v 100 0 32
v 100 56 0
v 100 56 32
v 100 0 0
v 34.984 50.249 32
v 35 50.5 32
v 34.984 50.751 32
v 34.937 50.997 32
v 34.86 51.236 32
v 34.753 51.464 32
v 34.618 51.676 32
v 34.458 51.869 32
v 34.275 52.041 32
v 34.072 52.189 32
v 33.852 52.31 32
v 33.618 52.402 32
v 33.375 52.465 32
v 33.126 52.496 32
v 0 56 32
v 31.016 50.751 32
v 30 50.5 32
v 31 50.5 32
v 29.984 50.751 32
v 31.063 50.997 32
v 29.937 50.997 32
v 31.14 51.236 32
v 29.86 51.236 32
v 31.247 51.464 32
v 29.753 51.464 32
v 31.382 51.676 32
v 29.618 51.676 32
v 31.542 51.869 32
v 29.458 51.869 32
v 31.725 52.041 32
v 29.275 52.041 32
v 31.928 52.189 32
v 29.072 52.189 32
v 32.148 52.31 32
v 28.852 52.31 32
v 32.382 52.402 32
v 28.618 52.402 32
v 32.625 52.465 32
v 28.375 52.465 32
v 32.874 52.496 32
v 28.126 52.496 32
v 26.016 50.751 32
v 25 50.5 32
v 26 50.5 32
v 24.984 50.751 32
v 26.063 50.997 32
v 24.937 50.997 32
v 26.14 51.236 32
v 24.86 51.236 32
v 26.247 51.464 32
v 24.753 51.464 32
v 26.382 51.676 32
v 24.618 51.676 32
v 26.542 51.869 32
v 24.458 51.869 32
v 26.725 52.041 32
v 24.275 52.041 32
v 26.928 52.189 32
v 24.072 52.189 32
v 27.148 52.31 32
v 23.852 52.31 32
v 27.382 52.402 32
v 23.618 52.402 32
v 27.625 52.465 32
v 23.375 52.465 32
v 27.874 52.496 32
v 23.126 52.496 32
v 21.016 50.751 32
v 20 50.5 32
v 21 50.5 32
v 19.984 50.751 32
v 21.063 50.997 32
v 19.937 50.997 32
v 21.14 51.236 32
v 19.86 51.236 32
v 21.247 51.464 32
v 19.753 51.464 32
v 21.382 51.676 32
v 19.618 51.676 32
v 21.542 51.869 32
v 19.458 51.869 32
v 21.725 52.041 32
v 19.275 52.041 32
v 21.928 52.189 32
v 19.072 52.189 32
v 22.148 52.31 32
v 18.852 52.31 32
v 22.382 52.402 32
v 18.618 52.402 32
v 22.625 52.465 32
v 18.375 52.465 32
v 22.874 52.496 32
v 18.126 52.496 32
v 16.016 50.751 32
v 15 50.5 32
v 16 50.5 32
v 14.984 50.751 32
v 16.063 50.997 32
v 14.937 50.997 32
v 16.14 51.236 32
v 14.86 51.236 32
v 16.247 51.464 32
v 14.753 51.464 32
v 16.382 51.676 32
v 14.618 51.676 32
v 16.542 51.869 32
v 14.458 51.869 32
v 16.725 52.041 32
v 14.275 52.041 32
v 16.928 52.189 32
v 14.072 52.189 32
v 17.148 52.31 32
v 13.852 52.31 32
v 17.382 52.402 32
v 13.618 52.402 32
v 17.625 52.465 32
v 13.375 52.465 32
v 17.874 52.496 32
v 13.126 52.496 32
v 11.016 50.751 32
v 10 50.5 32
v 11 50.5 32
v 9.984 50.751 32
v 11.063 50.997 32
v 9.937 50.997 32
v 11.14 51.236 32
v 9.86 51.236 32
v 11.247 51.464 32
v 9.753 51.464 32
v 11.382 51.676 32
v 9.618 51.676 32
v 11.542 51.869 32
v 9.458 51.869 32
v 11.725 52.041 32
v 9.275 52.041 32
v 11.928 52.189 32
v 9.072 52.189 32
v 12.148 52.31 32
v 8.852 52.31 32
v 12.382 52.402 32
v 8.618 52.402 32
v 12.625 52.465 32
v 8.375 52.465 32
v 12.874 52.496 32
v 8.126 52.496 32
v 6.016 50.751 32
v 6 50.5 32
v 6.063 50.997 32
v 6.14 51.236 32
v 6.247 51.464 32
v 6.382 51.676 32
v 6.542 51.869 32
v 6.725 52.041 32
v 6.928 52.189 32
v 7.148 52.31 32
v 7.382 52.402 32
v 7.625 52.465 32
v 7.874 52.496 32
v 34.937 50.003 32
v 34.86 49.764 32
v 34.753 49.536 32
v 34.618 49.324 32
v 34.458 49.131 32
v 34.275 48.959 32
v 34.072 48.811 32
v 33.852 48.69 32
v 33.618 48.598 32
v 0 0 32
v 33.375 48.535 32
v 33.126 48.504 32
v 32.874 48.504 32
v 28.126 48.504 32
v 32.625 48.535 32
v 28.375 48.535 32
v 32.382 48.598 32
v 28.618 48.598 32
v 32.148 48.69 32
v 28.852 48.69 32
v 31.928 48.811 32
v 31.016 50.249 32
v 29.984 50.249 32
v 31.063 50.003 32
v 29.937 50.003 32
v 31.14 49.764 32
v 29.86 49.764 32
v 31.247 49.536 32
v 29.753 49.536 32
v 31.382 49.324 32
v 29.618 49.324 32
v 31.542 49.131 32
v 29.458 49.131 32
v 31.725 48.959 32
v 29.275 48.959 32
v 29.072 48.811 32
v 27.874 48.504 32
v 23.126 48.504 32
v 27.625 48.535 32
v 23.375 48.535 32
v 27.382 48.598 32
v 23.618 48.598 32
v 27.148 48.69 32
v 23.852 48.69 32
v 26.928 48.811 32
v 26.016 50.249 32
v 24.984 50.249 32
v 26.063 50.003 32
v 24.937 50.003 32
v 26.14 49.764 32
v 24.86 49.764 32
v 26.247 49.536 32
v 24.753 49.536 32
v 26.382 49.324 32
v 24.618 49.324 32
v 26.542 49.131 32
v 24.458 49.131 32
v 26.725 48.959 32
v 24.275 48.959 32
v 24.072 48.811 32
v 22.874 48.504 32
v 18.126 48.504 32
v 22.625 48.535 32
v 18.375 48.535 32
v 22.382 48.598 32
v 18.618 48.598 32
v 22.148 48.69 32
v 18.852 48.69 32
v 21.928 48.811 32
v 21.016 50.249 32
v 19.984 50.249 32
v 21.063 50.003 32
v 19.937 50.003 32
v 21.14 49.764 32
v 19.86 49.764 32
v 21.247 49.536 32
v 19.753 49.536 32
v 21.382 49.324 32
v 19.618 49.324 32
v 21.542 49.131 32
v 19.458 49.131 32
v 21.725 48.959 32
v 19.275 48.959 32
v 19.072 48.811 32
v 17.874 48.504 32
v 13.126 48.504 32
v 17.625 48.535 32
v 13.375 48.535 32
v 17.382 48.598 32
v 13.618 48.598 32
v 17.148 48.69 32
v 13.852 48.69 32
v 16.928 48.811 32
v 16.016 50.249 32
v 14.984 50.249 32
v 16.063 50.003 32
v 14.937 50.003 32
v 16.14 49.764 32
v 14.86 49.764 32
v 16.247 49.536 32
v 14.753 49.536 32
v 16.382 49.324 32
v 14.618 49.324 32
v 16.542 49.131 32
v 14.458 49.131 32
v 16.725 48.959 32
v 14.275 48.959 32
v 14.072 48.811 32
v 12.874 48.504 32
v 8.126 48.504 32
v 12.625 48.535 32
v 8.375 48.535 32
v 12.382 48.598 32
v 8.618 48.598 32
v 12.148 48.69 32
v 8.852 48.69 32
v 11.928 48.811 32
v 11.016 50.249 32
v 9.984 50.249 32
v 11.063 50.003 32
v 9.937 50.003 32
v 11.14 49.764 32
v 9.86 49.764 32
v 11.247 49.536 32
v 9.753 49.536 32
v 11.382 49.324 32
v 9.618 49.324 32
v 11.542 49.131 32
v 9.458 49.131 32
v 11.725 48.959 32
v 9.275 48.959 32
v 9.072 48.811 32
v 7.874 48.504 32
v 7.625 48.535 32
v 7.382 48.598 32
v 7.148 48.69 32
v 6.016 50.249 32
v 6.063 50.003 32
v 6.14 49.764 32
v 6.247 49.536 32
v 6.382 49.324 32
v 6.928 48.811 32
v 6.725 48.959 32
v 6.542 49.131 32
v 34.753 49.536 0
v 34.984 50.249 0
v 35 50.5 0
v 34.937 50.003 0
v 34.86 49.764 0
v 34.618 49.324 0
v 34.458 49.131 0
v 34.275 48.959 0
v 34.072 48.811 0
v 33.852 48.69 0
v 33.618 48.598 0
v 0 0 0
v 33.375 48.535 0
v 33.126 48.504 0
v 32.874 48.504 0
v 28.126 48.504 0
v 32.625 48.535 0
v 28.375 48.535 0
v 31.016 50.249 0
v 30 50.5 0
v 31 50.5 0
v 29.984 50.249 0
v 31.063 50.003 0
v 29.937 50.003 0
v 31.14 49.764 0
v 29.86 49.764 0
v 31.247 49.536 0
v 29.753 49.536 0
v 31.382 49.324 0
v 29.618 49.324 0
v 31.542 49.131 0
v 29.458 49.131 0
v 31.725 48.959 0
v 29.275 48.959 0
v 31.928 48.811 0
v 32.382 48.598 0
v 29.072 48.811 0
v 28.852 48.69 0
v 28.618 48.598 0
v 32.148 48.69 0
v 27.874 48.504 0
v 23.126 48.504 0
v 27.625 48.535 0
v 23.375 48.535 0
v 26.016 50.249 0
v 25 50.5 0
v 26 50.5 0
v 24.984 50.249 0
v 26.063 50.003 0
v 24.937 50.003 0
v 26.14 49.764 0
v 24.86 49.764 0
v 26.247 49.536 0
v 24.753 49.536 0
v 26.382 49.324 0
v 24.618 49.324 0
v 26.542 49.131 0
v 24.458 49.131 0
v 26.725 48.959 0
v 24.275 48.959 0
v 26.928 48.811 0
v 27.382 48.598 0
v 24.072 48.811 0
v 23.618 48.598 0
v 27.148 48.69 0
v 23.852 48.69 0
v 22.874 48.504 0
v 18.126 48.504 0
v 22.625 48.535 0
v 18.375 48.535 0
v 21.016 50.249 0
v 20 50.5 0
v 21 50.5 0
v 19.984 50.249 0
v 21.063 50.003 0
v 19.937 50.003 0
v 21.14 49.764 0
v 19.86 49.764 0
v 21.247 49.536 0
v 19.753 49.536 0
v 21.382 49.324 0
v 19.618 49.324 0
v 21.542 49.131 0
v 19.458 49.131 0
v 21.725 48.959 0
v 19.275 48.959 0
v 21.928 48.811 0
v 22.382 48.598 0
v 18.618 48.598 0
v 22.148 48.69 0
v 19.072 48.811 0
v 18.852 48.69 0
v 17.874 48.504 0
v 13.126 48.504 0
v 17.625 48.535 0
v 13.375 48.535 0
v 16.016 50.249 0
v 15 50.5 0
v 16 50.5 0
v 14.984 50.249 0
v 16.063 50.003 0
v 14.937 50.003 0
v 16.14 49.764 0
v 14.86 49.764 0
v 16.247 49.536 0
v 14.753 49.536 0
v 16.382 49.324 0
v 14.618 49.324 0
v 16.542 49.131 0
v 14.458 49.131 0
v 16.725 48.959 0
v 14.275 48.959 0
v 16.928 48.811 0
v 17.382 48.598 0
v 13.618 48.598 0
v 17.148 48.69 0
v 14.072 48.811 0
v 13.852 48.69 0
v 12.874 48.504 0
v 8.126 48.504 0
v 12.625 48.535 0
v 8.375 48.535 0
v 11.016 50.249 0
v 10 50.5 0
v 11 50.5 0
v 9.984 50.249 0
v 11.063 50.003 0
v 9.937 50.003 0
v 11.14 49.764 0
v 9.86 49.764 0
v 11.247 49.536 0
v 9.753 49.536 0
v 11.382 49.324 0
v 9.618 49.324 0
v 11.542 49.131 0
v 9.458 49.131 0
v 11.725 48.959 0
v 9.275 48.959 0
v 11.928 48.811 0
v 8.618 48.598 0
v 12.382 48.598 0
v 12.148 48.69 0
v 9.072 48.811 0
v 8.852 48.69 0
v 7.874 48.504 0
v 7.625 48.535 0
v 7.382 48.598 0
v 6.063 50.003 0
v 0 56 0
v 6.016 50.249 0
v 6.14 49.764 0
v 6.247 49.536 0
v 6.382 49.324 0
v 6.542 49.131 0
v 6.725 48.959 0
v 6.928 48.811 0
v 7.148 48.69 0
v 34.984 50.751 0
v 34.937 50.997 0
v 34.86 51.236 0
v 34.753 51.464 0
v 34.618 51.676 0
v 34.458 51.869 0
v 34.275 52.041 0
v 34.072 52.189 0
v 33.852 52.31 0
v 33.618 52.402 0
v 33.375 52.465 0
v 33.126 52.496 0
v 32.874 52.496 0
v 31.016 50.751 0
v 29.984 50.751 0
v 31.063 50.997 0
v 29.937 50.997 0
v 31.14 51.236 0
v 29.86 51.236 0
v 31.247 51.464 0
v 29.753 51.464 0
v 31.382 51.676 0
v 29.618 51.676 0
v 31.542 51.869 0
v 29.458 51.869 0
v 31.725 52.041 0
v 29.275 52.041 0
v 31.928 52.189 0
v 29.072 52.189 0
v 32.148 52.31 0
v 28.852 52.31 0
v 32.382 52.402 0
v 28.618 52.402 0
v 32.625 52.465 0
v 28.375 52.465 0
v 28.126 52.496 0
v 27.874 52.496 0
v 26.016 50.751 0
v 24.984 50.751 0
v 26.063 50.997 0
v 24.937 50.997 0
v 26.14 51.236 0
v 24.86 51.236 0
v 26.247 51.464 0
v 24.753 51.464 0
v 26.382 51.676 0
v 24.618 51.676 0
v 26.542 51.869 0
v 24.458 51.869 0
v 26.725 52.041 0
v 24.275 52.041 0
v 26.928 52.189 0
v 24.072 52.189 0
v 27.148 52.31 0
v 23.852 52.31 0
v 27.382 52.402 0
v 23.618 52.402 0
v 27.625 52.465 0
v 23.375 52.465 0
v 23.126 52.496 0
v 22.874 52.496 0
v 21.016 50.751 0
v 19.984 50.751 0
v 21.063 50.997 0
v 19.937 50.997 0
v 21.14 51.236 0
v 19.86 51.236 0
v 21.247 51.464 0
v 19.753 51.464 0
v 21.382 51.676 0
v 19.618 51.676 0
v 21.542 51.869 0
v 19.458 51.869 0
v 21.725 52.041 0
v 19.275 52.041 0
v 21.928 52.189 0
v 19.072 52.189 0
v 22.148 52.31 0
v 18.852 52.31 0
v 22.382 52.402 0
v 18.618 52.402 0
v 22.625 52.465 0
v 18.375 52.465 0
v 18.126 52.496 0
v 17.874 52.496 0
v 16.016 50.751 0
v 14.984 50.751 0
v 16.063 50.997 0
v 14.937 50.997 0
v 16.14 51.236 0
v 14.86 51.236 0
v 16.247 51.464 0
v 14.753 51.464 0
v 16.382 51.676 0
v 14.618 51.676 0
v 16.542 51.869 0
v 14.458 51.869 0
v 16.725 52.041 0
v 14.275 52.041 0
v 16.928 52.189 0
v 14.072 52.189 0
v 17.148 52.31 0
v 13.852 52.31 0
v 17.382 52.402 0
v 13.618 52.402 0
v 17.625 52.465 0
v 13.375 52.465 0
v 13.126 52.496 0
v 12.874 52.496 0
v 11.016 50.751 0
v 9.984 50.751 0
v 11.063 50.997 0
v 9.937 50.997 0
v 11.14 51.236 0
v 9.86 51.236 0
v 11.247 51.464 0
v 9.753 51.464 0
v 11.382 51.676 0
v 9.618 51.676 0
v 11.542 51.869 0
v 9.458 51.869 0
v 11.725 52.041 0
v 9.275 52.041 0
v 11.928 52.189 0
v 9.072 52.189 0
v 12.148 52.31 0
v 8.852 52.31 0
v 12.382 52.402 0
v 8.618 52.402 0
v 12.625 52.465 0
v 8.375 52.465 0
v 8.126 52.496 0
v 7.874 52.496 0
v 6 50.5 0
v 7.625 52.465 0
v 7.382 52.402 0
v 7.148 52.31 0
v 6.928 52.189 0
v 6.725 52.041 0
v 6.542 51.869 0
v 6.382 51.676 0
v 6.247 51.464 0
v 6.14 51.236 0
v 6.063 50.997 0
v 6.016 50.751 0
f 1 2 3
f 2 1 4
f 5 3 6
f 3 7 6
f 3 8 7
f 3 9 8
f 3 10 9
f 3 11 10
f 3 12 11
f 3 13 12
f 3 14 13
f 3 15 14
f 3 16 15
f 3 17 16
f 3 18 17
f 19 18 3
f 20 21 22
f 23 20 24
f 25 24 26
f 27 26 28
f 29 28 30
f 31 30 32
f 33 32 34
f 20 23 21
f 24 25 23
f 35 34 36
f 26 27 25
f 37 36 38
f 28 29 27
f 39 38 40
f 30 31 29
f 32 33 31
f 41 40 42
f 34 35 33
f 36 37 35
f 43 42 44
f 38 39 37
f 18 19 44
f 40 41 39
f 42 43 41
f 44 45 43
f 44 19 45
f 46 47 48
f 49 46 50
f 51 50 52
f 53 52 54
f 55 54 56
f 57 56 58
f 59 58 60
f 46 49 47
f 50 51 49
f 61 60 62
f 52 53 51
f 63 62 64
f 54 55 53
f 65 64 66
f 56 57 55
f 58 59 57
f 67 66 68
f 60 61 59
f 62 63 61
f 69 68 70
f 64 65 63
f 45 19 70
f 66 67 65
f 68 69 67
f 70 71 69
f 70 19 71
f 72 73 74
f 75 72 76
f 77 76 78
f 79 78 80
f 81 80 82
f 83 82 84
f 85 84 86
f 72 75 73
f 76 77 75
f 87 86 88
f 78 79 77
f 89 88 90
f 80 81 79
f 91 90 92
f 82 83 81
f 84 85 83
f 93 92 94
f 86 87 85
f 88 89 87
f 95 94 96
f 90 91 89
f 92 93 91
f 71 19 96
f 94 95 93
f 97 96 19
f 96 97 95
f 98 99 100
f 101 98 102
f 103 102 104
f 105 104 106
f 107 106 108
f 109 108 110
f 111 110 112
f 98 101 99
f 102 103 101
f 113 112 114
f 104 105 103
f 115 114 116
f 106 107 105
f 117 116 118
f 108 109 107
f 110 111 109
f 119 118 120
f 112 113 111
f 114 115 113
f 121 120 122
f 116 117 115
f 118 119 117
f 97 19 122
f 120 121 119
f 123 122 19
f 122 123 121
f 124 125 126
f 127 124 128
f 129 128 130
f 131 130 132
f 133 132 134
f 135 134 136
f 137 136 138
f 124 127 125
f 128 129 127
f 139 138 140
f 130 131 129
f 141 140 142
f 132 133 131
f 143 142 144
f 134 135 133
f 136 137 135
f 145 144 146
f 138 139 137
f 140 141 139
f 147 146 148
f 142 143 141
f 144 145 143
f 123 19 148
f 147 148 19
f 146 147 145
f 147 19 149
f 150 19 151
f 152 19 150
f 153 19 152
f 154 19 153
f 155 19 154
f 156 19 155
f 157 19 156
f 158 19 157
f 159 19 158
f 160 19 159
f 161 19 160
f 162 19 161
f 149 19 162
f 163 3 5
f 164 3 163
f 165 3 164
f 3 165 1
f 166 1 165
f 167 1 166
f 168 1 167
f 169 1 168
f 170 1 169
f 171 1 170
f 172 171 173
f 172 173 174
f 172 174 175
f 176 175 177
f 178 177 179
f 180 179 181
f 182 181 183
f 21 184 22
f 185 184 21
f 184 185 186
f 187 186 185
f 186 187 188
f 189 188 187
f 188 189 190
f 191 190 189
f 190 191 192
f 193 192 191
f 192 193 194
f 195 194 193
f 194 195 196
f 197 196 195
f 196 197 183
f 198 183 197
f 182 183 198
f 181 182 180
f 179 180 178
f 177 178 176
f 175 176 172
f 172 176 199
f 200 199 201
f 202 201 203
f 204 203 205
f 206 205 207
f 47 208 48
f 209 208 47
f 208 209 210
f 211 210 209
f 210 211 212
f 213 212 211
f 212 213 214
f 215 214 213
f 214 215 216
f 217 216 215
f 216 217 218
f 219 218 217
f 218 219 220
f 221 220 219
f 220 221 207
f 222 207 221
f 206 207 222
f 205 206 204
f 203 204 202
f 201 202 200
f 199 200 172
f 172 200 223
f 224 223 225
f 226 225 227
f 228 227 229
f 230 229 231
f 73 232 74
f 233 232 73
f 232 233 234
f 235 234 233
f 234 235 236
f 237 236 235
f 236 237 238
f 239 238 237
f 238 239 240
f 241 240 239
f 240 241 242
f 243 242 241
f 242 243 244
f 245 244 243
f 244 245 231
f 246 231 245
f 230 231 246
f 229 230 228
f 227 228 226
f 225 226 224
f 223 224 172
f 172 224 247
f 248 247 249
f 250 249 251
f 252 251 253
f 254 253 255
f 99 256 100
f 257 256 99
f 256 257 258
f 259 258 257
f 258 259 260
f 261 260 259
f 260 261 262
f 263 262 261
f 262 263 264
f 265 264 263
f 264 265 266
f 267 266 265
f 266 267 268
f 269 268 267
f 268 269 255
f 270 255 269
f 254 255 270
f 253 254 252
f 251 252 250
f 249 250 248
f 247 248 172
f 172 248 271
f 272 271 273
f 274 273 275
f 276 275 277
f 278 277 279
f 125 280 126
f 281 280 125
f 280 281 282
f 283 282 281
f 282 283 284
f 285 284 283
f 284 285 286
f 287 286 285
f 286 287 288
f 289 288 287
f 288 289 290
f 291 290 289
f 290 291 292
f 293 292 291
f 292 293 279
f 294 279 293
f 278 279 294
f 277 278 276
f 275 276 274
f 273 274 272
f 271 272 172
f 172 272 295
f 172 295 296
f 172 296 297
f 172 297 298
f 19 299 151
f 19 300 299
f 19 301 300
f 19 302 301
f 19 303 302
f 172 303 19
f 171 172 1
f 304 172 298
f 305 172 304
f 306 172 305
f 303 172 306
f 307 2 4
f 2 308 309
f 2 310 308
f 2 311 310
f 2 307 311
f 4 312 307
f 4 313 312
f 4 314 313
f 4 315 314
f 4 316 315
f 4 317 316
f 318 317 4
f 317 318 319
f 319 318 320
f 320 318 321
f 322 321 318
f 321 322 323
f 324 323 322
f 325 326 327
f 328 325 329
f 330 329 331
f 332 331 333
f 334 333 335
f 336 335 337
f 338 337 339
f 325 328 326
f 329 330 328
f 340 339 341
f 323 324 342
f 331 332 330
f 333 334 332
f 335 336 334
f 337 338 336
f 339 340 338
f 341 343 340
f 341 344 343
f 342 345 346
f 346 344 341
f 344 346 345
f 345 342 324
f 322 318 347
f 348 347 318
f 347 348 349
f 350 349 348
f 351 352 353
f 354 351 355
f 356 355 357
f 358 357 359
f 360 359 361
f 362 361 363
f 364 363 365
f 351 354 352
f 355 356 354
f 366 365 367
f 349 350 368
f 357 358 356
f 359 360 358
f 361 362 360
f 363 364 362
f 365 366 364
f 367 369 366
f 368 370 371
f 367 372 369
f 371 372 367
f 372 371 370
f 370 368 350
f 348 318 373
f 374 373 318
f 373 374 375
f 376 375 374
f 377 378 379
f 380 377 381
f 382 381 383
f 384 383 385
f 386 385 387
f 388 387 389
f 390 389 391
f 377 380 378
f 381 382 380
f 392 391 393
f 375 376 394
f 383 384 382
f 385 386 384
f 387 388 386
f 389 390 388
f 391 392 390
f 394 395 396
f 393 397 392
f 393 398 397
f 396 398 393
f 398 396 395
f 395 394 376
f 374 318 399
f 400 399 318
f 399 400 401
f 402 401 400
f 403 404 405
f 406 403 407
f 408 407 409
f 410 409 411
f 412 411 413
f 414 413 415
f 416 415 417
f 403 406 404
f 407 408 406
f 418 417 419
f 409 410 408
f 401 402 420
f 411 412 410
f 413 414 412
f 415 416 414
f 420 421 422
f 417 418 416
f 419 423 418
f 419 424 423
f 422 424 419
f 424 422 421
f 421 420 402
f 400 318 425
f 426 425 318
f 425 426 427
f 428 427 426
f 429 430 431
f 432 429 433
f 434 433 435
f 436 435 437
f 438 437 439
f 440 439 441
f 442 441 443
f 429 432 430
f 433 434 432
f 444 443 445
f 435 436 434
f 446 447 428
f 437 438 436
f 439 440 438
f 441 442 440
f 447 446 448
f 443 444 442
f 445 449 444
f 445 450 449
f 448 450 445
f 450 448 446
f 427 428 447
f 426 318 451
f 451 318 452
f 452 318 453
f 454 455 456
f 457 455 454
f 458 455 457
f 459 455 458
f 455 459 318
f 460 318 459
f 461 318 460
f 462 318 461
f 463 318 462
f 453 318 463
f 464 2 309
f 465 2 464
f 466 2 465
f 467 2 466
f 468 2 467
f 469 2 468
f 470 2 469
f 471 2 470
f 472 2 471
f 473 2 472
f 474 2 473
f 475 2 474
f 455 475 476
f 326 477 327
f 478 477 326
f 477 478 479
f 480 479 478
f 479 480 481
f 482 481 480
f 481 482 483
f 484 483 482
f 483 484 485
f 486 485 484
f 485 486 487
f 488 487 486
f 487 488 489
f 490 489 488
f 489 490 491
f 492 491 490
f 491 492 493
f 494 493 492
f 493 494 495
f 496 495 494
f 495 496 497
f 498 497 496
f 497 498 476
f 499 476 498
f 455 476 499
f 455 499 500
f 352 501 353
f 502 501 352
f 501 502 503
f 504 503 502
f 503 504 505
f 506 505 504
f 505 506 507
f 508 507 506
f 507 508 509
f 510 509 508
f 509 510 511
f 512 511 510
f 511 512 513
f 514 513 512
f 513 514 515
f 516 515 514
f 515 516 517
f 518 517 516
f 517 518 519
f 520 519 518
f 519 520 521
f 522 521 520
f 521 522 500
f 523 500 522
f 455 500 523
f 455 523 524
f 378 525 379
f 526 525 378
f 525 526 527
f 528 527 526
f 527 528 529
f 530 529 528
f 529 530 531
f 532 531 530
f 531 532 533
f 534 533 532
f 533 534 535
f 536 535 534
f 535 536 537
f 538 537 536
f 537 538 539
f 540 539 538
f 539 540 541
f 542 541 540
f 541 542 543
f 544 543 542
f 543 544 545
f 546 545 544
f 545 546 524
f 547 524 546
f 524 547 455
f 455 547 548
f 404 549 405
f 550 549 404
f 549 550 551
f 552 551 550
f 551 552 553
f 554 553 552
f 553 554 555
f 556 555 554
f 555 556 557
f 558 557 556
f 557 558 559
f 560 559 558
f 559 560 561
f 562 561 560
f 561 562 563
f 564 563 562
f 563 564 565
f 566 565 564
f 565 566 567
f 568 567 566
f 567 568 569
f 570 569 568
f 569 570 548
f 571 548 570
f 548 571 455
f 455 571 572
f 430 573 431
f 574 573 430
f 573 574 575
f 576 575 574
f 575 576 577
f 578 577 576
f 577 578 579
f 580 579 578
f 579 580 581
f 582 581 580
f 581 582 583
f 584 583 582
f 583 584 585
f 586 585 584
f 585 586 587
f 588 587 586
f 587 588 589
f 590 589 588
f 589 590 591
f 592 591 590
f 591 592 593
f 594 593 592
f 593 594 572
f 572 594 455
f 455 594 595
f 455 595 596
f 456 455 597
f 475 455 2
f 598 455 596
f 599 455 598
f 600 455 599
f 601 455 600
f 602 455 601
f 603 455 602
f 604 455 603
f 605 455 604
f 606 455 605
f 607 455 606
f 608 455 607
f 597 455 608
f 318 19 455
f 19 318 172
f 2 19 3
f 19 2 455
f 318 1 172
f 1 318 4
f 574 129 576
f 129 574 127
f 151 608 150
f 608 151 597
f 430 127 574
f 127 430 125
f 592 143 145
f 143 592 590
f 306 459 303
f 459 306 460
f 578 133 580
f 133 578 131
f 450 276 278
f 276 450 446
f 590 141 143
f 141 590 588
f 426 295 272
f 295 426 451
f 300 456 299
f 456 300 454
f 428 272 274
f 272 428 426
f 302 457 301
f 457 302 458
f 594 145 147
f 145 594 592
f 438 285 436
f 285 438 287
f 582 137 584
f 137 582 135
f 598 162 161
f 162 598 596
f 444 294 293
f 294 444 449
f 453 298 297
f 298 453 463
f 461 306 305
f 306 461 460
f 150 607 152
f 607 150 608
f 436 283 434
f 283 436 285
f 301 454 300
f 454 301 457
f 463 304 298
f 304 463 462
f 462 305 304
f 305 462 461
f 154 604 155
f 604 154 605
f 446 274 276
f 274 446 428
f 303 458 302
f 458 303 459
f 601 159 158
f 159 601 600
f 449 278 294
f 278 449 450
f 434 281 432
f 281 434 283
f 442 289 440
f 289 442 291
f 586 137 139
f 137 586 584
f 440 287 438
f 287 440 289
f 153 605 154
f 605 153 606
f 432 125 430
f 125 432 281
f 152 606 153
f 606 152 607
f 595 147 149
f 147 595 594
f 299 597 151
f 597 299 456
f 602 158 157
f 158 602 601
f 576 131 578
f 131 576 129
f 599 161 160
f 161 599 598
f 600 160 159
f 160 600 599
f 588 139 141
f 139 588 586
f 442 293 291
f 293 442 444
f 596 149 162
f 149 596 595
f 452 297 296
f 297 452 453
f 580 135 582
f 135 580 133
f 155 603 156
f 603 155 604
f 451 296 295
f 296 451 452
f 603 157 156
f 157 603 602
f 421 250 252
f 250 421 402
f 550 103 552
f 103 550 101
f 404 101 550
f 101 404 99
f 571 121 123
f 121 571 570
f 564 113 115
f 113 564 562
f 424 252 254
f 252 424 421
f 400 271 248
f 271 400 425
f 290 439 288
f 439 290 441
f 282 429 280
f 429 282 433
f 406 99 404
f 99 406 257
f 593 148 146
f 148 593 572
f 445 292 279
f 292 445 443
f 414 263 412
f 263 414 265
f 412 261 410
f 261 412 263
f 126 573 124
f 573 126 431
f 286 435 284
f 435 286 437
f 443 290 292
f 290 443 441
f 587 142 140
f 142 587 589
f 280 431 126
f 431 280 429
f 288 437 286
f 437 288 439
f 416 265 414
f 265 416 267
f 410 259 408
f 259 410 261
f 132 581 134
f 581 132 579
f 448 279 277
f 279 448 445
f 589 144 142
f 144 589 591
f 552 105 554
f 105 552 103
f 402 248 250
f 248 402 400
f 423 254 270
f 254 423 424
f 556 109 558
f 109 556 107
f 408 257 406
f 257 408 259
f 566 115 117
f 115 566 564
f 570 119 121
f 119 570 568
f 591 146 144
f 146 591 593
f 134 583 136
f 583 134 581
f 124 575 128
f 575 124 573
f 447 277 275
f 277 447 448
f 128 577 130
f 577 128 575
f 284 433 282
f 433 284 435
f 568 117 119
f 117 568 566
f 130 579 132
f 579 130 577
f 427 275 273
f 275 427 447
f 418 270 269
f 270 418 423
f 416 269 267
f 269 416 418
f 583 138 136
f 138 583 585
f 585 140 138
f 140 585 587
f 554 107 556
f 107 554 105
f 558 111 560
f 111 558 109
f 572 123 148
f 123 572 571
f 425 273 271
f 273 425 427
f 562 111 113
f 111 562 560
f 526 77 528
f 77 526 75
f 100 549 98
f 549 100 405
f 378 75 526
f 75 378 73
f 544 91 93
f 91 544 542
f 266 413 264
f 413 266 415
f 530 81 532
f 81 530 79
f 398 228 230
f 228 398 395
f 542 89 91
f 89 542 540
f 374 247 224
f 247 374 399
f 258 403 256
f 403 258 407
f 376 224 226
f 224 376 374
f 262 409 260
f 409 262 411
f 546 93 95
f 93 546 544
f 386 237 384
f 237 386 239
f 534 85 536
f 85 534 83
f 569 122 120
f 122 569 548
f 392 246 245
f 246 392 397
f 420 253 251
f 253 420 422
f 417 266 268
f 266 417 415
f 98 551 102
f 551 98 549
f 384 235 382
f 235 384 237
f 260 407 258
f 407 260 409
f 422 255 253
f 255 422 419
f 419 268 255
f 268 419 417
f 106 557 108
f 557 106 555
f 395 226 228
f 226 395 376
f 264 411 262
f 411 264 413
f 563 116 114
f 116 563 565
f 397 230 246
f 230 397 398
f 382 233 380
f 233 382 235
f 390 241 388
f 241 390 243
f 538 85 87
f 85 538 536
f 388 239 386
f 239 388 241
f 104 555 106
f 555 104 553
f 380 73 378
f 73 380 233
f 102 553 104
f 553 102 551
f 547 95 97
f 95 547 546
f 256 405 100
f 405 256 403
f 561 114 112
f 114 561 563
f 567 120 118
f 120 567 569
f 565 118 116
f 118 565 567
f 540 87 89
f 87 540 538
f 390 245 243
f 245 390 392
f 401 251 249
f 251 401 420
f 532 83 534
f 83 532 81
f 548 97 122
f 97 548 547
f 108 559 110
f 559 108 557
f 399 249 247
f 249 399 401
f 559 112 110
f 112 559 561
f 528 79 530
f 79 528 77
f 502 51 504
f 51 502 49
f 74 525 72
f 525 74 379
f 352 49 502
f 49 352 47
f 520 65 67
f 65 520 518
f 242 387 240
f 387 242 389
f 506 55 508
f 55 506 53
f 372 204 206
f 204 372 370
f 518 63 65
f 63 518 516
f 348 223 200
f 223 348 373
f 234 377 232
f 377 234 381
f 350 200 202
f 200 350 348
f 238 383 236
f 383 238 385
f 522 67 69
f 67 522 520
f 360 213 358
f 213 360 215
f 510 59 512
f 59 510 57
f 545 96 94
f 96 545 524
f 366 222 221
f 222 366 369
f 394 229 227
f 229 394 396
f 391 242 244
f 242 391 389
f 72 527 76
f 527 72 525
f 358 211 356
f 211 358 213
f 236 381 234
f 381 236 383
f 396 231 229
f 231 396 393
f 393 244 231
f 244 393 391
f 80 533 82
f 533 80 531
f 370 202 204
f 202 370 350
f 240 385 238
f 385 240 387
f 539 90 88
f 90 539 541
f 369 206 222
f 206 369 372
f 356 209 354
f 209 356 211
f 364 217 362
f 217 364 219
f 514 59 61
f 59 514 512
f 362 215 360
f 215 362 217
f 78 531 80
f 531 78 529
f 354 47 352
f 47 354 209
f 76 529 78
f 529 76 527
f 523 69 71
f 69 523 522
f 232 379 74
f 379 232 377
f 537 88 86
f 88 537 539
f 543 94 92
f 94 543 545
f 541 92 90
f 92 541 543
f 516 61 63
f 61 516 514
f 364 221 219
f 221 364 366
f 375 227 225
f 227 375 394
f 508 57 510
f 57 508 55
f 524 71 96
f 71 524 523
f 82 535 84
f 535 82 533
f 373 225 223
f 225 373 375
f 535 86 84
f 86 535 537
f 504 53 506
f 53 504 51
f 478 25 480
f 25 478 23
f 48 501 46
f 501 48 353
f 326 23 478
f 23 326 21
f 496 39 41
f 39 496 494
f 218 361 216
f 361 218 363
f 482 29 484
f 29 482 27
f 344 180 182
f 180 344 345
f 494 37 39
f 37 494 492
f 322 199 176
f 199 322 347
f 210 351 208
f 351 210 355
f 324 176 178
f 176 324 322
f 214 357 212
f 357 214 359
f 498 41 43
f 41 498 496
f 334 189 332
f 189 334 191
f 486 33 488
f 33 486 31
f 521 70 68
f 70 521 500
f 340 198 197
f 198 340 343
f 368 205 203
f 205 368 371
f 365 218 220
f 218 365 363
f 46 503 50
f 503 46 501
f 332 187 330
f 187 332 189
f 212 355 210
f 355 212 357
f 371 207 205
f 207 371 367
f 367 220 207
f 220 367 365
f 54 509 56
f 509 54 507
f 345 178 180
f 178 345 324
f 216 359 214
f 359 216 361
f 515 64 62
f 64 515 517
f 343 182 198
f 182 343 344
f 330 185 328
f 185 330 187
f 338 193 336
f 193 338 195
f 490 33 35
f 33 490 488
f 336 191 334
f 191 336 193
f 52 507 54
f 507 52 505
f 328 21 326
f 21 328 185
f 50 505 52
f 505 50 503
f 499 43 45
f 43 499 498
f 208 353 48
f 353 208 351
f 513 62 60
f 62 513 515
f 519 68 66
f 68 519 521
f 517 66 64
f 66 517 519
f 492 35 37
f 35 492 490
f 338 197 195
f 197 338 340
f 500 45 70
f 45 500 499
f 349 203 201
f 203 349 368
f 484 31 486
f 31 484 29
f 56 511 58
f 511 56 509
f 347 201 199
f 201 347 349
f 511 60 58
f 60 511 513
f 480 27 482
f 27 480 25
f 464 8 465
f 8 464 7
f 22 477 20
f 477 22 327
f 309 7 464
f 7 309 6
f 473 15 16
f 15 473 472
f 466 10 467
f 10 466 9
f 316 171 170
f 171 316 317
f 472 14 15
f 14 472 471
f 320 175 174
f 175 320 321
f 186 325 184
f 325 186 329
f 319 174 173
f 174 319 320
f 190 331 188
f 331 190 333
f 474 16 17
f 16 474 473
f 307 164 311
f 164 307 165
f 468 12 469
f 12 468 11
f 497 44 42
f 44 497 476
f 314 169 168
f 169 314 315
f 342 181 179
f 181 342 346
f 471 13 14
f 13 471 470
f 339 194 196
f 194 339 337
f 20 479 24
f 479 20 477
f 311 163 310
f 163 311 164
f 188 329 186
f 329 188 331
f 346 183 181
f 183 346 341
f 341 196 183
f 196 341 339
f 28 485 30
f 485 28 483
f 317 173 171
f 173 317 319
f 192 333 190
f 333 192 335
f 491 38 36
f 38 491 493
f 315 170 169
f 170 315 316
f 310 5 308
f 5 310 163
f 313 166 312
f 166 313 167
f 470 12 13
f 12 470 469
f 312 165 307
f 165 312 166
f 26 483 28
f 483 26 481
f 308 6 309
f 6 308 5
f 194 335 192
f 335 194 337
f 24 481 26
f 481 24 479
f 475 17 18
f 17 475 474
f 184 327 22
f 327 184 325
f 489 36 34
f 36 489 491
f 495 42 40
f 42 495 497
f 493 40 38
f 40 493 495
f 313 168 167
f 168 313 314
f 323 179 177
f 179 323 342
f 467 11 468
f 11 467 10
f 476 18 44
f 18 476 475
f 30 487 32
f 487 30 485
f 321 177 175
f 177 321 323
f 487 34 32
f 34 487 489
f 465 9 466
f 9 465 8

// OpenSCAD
width = 100;
depth = 56;
height = 32;
gap = 1; // Gap between the board due to the 1mm screen connector

module hole(index){
    offsetx = 7;
    offsety = 5.5;
    r = 2;
    hole_distance = 5;
    
    translate([gap + offsetx + (index * 5), depth - offsety])
        linear_extrude(height)
            circle(r, $fn = 50);
    
}



module main(){
difference()
{
    cube([ width, depth, height ]);
    hole(0);
        hole(1);
        hole(2);
        hole(3);
        hole(4);
        hole(5);
}    
    }
  

main();
